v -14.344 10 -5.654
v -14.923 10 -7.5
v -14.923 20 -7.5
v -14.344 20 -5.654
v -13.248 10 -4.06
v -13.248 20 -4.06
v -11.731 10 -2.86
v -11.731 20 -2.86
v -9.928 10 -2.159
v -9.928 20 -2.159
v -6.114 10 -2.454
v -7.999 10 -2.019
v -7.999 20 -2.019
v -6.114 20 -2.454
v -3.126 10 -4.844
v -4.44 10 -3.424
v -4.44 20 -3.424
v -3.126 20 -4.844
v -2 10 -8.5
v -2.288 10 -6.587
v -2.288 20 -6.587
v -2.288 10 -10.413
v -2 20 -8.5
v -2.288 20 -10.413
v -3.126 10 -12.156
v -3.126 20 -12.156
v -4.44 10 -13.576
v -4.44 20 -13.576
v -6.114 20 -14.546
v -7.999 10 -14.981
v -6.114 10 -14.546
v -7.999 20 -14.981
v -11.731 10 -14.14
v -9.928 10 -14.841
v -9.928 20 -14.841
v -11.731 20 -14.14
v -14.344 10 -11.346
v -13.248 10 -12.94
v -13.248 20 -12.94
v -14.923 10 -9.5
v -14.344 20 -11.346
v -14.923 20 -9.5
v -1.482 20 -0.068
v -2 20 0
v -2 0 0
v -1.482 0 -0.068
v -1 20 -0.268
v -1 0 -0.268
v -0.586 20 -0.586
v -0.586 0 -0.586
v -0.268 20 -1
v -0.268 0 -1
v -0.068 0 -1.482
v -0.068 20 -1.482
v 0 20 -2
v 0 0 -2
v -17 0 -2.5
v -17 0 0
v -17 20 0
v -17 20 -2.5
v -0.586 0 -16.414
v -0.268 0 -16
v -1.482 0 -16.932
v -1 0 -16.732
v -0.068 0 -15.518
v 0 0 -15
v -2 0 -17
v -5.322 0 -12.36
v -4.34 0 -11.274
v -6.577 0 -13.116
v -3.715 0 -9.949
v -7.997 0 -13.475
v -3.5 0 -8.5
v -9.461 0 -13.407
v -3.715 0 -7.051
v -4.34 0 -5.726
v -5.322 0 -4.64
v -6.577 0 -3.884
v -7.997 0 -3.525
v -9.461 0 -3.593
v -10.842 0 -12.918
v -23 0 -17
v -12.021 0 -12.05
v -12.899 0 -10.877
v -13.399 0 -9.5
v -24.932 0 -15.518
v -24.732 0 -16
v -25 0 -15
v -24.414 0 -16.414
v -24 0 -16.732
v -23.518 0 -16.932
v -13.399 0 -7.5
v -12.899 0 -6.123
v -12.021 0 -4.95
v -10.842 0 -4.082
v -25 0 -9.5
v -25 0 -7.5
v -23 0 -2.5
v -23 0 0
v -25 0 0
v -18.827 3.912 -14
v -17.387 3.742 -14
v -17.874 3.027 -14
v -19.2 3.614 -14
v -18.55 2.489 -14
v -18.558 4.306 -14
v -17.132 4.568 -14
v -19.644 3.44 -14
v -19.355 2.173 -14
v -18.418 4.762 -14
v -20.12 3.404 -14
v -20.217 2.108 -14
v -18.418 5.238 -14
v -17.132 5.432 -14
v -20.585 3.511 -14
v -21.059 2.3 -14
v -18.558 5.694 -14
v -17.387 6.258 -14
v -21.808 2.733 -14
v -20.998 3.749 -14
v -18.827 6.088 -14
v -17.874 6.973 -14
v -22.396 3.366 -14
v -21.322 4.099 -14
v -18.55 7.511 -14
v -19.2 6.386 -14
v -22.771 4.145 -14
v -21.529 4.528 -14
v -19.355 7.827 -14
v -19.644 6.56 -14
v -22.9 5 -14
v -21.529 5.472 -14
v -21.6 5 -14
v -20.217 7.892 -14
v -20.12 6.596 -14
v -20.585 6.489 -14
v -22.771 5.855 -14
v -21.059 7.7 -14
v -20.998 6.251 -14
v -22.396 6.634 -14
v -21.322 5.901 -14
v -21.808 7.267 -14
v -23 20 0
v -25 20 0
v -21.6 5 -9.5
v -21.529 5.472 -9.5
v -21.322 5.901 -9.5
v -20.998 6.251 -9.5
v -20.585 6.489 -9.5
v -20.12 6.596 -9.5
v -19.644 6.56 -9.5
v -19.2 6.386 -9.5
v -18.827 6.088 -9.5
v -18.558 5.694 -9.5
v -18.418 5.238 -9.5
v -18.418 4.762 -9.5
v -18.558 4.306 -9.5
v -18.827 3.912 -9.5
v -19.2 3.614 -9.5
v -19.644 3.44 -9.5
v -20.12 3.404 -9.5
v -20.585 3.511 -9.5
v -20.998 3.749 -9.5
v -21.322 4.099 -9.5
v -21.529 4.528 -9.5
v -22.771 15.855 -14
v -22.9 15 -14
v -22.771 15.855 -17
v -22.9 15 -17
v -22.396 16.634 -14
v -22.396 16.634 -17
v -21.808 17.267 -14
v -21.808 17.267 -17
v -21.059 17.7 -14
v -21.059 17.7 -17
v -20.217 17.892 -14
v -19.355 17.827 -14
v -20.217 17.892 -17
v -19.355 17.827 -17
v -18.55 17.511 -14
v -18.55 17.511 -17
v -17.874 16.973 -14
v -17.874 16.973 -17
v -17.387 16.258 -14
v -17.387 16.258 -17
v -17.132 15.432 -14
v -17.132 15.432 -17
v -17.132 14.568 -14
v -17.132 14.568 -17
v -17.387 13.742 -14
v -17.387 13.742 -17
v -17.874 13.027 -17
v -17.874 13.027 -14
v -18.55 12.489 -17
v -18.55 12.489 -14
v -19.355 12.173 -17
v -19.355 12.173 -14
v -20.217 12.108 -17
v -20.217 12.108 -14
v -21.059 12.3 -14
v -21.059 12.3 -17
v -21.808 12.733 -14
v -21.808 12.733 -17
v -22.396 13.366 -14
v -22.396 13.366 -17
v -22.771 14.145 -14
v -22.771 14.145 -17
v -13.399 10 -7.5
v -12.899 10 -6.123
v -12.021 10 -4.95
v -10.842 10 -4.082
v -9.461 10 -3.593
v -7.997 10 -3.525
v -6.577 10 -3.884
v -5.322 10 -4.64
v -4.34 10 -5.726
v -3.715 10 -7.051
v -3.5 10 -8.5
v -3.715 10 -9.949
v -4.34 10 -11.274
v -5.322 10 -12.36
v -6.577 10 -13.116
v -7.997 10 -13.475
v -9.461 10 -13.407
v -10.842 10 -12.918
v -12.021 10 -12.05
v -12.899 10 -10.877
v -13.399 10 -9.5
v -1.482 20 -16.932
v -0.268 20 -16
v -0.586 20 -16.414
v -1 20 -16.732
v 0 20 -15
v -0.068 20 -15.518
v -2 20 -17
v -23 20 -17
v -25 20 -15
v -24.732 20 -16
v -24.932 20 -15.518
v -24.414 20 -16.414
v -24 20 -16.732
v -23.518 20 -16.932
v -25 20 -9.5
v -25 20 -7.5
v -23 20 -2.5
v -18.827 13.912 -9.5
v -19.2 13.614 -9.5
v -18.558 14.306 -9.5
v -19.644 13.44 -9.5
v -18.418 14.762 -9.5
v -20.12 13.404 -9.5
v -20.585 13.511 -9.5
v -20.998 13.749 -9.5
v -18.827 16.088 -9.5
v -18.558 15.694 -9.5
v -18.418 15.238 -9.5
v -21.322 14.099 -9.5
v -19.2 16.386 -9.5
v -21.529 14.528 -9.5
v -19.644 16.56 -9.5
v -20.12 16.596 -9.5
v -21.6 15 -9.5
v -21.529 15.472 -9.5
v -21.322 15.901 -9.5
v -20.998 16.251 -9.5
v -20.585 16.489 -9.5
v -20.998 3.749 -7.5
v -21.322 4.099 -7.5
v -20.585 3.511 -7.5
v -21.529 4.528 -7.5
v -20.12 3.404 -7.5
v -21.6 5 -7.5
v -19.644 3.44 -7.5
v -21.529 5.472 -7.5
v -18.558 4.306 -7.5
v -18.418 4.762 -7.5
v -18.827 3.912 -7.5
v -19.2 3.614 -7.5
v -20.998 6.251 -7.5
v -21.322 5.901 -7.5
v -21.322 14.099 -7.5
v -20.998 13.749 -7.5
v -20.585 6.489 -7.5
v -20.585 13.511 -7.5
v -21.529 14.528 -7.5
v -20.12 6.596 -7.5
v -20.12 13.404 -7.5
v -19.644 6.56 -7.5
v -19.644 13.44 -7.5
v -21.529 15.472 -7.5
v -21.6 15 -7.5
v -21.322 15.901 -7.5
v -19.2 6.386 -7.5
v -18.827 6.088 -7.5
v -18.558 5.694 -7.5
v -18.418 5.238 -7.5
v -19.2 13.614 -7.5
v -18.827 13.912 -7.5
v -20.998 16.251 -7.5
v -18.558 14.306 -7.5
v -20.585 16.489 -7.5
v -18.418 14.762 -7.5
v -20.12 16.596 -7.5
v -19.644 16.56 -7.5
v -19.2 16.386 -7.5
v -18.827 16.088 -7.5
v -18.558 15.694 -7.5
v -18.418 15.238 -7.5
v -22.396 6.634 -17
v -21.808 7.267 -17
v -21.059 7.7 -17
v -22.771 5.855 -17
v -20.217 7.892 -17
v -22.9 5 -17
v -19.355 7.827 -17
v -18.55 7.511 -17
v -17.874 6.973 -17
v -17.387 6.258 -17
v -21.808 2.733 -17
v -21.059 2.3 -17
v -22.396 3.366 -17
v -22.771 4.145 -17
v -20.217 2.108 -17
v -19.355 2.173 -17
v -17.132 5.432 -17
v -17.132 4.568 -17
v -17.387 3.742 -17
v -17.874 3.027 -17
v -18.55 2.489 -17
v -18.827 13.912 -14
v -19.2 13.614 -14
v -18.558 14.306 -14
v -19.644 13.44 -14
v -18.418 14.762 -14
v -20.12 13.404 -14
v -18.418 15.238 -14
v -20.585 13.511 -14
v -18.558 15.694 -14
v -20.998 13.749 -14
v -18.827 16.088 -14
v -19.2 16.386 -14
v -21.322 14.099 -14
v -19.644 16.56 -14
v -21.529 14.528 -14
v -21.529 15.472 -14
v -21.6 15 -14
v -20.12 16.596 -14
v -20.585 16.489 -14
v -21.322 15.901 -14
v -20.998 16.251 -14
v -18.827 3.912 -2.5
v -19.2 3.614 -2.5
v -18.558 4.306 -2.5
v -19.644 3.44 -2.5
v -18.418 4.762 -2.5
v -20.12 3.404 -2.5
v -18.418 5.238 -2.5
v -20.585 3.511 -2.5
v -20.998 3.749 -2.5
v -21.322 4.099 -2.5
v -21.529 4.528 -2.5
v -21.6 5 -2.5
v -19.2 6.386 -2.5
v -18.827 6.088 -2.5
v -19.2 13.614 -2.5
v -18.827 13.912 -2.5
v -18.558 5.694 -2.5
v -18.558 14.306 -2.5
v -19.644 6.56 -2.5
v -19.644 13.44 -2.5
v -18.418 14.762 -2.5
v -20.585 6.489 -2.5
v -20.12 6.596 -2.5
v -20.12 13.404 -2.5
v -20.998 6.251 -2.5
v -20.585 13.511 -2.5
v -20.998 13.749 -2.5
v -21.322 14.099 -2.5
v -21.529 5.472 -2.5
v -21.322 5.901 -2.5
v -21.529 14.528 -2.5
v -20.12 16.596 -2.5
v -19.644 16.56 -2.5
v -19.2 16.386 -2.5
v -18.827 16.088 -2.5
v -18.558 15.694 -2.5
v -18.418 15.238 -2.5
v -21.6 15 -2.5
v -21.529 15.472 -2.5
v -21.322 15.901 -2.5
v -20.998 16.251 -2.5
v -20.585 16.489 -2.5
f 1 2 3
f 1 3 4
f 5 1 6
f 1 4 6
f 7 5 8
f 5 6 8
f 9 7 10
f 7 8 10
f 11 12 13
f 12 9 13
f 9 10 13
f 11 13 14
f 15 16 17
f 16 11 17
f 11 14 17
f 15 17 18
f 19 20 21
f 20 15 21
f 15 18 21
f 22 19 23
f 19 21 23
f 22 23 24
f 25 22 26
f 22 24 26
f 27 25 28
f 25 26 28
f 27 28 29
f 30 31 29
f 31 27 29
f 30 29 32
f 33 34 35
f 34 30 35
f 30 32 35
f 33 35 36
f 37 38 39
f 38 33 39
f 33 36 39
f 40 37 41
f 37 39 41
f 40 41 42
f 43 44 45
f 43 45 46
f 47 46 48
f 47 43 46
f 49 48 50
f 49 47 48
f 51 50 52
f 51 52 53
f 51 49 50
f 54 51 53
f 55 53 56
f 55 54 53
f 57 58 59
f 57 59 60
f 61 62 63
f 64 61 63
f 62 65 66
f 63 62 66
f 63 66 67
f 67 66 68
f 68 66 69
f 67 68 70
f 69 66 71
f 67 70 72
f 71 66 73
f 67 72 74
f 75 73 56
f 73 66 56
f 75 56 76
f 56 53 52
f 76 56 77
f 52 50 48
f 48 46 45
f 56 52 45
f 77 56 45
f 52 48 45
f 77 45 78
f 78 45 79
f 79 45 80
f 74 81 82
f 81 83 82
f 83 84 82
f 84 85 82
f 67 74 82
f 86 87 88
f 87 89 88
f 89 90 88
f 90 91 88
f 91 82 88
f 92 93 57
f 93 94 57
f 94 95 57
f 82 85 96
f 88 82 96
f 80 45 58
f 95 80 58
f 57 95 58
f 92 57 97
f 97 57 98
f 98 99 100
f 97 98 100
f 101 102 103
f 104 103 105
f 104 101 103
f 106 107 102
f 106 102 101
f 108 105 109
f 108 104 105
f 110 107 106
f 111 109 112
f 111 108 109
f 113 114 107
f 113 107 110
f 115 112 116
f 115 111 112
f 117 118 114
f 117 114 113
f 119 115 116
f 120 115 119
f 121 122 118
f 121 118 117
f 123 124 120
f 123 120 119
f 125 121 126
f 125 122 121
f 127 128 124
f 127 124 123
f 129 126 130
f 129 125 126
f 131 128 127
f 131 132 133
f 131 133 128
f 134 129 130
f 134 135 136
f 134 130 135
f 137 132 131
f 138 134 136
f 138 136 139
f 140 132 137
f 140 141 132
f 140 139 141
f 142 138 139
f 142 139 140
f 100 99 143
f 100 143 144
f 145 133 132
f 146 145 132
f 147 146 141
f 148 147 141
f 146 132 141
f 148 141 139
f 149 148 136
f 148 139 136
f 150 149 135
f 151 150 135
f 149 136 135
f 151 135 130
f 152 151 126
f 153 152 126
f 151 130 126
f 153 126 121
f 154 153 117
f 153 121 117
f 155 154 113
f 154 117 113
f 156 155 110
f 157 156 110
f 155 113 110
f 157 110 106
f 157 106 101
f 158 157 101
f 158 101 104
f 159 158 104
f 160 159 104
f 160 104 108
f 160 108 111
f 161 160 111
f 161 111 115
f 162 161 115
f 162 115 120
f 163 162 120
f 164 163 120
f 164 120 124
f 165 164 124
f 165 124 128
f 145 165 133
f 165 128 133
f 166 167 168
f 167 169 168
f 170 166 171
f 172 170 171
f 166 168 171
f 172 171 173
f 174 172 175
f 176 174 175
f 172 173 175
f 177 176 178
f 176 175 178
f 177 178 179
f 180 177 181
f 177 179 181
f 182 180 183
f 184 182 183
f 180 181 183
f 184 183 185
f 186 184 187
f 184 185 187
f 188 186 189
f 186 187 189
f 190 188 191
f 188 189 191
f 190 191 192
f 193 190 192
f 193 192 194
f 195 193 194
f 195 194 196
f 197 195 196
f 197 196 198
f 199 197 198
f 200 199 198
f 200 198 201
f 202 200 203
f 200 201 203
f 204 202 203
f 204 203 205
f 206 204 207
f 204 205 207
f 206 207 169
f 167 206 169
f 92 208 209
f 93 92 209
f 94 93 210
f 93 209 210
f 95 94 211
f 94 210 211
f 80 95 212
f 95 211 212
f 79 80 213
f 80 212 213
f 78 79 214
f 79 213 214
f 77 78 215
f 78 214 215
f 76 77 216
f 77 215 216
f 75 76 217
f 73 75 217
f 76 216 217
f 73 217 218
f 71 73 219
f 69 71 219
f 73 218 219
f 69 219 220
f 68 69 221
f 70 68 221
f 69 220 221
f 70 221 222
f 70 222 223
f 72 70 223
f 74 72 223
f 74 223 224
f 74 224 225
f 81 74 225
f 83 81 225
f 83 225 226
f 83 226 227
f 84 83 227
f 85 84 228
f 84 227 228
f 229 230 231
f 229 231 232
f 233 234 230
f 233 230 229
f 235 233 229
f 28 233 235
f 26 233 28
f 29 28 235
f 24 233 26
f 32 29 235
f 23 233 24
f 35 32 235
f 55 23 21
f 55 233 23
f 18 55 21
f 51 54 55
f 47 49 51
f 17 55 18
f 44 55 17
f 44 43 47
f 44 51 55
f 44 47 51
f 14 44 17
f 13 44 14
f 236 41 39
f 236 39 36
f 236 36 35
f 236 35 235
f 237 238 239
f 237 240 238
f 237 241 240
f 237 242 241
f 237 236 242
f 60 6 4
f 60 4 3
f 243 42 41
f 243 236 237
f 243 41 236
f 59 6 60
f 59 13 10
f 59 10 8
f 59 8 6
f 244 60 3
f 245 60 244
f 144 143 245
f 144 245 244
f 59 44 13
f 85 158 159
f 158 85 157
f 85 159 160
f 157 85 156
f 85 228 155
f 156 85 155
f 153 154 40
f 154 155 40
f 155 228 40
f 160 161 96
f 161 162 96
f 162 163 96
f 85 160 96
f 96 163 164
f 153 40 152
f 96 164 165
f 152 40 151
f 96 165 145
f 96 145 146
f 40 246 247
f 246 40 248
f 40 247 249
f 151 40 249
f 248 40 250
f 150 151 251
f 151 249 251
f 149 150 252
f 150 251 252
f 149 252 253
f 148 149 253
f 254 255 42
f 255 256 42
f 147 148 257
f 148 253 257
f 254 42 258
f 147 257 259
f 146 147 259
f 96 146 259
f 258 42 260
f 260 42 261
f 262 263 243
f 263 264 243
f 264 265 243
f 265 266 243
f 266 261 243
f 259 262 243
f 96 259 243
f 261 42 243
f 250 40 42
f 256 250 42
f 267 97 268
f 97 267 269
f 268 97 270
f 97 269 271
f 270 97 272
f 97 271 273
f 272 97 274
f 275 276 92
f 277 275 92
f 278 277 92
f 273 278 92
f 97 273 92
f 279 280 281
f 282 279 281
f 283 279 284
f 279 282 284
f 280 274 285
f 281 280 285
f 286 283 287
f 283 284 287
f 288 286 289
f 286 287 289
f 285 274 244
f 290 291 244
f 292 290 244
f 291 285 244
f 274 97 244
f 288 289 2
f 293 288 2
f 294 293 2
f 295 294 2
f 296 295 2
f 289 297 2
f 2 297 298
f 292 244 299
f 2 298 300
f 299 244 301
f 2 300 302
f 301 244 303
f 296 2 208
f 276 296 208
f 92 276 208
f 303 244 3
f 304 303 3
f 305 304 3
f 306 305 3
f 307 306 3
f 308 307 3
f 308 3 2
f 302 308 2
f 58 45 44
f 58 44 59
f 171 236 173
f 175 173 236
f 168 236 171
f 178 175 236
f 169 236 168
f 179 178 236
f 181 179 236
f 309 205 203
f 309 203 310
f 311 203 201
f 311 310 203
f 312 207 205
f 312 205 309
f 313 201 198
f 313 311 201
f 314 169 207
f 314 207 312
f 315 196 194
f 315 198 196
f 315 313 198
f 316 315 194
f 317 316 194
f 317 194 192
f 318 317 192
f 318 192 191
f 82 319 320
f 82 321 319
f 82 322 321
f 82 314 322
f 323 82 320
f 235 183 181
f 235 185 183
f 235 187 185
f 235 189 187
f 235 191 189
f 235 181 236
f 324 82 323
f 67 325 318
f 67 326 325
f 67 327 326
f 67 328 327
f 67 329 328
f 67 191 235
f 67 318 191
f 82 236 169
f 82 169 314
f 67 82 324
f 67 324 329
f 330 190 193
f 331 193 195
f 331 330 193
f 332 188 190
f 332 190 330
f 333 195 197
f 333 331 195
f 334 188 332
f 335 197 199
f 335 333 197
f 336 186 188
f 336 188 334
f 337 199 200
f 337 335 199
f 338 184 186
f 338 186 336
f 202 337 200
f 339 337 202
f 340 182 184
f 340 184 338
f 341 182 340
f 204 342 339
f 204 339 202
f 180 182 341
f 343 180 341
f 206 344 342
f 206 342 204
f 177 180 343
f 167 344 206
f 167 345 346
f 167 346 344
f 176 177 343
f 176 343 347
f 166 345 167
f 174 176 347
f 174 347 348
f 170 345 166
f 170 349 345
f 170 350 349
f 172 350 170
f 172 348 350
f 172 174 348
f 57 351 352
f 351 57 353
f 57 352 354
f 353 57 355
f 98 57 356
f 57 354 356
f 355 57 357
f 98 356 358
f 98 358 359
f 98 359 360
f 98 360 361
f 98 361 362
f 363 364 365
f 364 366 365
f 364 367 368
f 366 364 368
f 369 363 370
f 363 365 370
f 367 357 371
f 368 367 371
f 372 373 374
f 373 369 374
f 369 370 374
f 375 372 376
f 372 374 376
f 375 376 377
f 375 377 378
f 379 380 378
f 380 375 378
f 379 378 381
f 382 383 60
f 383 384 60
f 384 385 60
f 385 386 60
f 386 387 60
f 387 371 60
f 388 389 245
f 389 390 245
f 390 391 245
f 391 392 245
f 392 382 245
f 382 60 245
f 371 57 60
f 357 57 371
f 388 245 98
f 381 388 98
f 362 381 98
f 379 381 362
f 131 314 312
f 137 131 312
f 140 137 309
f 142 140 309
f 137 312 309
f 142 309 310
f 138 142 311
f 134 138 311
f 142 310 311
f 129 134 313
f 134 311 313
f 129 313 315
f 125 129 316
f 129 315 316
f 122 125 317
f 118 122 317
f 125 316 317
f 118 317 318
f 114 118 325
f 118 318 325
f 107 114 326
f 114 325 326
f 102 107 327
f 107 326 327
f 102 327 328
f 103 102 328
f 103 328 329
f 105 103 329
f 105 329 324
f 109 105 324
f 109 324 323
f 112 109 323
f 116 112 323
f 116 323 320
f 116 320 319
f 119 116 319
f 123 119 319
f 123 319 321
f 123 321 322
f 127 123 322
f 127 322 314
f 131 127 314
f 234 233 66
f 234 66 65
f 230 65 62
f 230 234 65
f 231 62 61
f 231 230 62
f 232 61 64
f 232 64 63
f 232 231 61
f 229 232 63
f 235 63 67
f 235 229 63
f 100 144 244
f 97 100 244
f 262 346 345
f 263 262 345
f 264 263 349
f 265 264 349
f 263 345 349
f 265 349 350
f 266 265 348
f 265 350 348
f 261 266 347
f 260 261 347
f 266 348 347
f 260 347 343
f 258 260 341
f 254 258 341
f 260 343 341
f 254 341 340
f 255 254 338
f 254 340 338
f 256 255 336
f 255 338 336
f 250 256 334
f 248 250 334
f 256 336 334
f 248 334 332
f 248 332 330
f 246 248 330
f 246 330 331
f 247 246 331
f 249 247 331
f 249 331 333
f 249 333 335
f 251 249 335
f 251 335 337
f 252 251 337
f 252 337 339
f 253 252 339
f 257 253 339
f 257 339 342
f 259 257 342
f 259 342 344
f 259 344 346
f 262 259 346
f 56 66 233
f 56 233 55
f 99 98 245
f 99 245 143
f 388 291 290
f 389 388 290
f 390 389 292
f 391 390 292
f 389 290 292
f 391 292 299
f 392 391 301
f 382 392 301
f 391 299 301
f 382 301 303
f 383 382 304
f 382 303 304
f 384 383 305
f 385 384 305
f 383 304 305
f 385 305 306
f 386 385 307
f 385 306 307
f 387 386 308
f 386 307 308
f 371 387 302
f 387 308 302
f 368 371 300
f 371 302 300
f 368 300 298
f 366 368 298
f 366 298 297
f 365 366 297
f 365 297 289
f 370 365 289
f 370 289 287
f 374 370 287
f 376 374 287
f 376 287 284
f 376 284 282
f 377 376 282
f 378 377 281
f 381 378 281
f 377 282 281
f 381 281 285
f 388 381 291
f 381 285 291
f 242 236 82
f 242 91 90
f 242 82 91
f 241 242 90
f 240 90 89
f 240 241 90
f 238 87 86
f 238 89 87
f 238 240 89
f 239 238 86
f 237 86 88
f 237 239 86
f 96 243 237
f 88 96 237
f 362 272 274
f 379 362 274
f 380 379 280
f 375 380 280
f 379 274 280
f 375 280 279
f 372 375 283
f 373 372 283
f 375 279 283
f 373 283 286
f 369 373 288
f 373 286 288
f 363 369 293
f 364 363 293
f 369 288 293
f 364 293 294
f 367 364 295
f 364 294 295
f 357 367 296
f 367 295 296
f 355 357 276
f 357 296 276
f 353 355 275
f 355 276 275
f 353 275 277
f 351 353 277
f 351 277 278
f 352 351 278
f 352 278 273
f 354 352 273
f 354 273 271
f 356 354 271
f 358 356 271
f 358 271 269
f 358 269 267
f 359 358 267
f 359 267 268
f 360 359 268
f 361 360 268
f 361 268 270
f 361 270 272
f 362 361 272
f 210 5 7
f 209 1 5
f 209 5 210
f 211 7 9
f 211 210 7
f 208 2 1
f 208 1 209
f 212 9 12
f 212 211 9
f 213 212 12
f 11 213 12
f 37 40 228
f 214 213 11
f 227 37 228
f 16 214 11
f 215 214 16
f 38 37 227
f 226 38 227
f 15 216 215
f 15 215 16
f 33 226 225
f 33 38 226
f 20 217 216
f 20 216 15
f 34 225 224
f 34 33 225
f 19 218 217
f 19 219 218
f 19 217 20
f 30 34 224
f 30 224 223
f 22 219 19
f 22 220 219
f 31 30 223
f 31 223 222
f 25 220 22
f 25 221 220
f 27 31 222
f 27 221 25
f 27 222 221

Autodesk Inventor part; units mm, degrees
ref_plane "YZ Plane" through (0, 0, 0) normal (1, 0, 0) x (0, 1, 0)
ref_plane "XZ Plane" through (0, 0, 0) normal (0, 1, 0) x (-1, 0, 0)
ref_plane "XY Plane" through (0, 0, 0) normal (0, 0, 1) x (1, 0, 0)
sketch "Sketch1" plane through (0, 0, 0) normal (0, 1, 0) x (-1, 0, 0)
  line L0 (0, 0) -> (25, 0)
  line L1 (25, 0) -> (25, -17)
  line L2 (25, -17) -> (0, -17)
  line L3 (0, -17) -> (0, 0)
  dimension "d0" = 17
  dimension "d1" = 25
extrude "Extrusion1" add sketch "Sketch1" along normal blind 20
sketch "Sketch2" plane through (0, 20, 0) normal (0, 1, 0) x (1, 0, 0)
  circle A0 centre (-8.5, 8.5) radius 5
  line L0 (-25, 0) -> (0, 0) projected
  line L1 (0, 0) -> (0, 17) projected
  dimension "d4" = 10
  dimension "d5" = 8.5
  dimension "d6" = 8.5
extrude "Extrusion2" cut sketch "Sketch2" against normal through all
sketch "Sketch3" plane through (0, 20, 0) normal (0, 1, 0) x (1, 0, 0)
  circle A0 centre (-8.5, 8.5) radius 6.5
  line L0 (-25, 0) -> (0, 0) projected
  line L1 (0, 0) -> (0, 17) projected
  dimension "d9" = 13
  dimension "d10" = 8.5
  dimension "d11" = 8.5
extrude "Extrusion3" cut sketch "Sketch3" against normal blind 10
sketch "Sketch4" plane through (0, 20, 0) normal (0, 1, 0) x (1, 0, 0)
  line L0 (-25, 17) -> (-25, 0) projected
  line L1 (-25, 7.5) -> (-12, 7.5)
  line L2 (-12, 7.5) -> (-12, 9.5)
  line L3 (-12, 9.5) -> (-25, 9.5)
  line L4 (-25, 9.5) -> (-25, 7.5)
  line L5 (-25, 0) -> (0, 0) projected
  dimension "d14" = 2
  dimension "d15" = 7.5
  dimension "d16" = 13
extrude "Extrusion4" cut sketch "Sketch4" against normal through all
sketch "Sketch5" plane through (0, 20, 0) normal (0, 1, 0) x (1, 0, 0)
  line L0 (-23, 0) -> (-17, 0)
  line L1 (-17, 0) -> (-17, 2.5)
  line L2 (-17, 2.5) -> (-23, 2.5)
  line L3 (-23, 2.5) -> (-23, 0)
  line L4 (-25, 7.5) -> (-25, 0) projected
  line L5 (-25, 0) -> (0, 0) projected
  dimension "d19" = 6
  dimension "d20" = 2.5
  dimension "d21" = 2
extrude "Extrusion5" cut sketch "Sketch5" against normal through all
sketch "Sketch6" plane through (0, 0, -17) normal (0, 0, -1) x (-1, 0, 0)
  circle A0 centre (20, 15) radius 1.6
  circle A1 centre (20, 5) radius 1.6
  line L0 (25, 0) -> (25, 20) projected
  line L1 (0, 20) -> (25, 20) projected
  line L2 (0, 0) -> (25, 0) projected
  dimension "d24" = 3.2
  dimension "d25" = 3.2
  dimension "d26" = 5
  dimension "d27" = 5
  dimension "d28" = 5
  dimension "d29" = 5
extrude "Extrusion6" cut sketch "Sketch6" against normal through all
sketch "Sketch7" plane through (0, 0, -17) normal (0, 0, -1) x (-1, 0, 0)
  circle A0 centre (20, 5) radius 2.9
  circle A1 centre (20, 15) radius 2.9
  line L0 (25, 0) -> (25, 20) projected
  line L1 (0, 0) -> (25, 0) projected
  line L2 (0, 20) -> (25, 20) projected
  dimension "d32" = 5.8
  dimension "d33" = 5.8
  dimension "d34" = 5
  dimension "d35" = 5
  dimension "d36" = 5
  dimension "d37" = 5
extrude "Extrusion7" cut sketch "Sketch7" against normal blind 3
fillet "Fillet1" radius 2 3 edges at (0, 10, -17) (0, 10, 0) (-25, 10, -17)
properties part number "ACCROCHE SUR ACIER"
